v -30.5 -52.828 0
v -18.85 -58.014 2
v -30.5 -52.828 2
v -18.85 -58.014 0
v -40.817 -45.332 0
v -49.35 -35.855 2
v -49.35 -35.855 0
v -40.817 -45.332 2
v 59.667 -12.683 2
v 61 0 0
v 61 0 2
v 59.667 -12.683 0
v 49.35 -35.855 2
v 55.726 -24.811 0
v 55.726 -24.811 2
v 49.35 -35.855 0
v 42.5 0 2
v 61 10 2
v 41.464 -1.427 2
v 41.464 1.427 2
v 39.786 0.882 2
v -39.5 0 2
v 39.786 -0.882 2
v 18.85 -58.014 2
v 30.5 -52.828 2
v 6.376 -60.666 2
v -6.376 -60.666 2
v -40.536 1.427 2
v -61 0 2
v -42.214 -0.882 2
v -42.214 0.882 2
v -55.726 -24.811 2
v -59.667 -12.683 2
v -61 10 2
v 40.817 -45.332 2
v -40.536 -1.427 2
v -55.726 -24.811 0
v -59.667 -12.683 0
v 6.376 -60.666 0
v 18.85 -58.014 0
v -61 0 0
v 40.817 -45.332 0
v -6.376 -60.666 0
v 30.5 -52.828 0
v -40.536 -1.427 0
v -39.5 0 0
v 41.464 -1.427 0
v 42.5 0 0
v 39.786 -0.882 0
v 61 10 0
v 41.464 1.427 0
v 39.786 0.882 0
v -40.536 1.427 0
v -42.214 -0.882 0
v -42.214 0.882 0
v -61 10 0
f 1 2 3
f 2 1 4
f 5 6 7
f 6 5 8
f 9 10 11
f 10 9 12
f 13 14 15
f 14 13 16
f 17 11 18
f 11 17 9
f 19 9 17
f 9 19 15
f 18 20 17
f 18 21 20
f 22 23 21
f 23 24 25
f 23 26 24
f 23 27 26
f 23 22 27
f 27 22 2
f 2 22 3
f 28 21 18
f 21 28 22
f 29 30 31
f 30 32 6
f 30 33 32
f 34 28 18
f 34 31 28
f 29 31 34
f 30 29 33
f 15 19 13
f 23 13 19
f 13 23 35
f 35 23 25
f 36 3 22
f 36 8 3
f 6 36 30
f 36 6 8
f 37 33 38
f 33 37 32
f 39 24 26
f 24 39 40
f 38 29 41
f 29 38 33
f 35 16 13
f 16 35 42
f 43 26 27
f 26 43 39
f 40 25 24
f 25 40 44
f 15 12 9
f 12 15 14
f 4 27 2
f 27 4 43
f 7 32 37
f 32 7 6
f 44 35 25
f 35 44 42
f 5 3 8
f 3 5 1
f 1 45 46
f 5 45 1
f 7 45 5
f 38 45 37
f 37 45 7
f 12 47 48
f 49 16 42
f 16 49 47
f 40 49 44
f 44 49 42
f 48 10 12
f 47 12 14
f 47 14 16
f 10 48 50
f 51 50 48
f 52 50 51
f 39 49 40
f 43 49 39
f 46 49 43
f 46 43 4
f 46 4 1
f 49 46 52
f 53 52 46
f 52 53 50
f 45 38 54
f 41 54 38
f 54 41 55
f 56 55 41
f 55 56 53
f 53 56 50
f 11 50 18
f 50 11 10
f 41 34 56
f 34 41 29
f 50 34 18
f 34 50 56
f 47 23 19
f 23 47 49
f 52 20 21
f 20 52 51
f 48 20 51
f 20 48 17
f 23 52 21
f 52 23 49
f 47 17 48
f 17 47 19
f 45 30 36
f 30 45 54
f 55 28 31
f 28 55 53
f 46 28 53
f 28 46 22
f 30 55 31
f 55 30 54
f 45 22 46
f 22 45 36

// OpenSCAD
GUT_WIDTH = 122;
GUT_HEIGHT = 50;
WALL_THICKNESS = 2;
GUT_LIP = 10;

module smallpanel(){
difference(){
    union(){
        difference(){
            cylinder(h = WALL_THICKNESS, r = GUT_WIDTH / 2, center=false);
            translate([-(GUT_WIDTH / 2),0,-1]) {
                cube([GUT_WIDTH, GUT_WIDTH / 2, WALL_THICKNESS + 4]);
            }
        }

        translate([-(GUT_WIDTH / 2),0,0]) {
            cube([GUT_WIDTH, GUT_LIP, WALL_THICKNESS]);
            }
        }
    //create screw holes
    translate([((GUT_WIDTH / 2) - 20),(GUT_LIP - 10),-1]){
    cylinder(h = WALL_THICKNESS + 2, r = 1.5,center=false);
}
translate([-(GUT_WIDTH / 2 - 20),(GUT_LIP - 10),-1]){
    cylinder(h = WALL_THICKNESS + 2, r = 1.5,center=false);
}
}
}

smallpanel();
